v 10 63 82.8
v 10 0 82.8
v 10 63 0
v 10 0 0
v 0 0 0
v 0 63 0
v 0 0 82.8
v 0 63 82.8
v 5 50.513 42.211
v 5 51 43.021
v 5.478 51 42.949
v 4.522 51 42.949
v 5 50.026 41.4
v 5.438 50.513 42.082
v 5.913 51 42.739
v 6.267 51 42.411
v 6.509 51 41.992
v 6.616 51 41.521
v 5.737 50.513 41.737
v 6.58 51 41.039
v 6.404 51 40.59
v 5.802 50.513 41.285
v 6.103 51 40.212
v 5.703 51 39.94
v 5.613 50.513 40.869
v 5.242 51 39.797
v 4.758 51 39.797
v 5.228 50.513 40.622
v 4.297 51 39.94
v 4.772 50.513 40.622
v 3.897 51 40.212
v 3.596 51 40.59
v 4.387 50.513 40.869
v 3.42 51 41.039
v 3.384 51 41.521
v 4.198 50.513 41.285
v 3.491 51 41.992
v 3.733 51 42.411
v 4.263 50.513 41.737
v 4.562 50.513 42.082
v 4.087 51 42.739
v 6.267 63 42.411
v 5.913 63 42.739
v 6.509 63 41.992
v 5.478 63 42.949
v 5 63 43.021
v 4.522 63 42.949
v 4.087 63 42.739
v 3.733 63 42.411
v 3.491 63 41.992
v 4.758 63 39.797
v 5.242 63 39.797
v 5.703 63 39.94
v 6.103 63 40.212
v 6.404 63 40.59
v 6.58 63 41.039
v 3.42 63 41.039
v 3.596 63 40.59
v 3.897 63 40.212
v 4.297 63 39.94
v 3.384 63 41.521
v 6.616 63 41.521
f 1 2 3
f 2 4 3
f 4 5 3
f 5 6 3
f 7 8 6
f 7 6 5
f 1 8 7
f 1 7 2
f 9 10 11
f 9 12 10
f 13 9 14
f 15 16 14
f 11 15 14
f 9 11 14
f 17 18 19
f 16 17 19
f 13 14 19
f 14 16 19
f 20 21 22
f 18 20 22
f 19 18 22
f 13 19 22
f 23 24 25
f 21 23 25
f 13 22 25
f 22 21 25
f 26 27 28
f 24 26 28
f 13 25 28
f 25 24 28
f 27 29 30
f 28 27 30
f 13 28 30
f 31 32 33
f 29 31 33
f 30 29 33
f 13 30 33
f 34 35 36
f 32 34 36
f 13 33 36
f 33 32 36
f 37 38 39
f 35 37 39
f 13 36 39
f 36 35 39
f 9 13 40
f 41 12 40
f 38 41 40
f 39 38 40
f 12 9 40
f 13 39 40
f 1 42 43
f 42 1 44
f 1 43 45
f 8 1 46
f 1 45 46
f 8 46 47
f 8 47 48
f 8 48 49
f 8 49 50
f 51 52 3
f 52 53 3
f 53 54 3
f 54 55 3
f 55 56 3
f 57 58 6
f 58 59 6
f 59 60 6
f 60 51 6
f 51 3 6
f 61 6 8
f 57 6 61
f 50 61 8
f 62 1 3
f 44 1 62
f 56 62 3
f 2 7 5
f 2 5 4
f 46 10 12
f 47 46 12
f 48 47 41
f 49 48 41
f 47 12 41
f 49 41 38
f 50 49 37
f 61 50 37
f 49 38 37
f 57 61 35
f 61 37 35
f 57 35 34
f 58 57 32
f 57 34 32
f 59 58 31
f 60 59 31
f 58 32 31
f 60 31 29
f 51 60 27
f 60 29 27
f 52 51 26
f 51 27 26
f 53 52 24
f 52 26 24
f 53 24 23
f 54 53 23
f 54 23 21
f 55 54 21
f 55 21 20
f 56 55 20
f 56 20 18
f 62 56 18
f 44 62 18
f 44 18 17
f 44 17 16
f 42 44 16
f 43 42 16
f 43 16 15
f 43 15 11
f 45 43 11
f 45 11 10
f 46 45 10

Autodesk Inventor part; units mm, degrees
ref_plane "YZ Plane" through (0, 0, 0) normal (1, 0, 0) x (0, 1, 0)
ref_plane "XZ Plane" through (0, 0, 0) normal (0, 1, 0) x (-1, 0, 0)
ref_plane "XY Plane" through (0, 0, 0) normal (0, 0, 1) x (1, 0, 0)
sketch "Sketch1" plane through (0, 0, 0) normal (0, 0, 1) x (1, 0, 0)
  line L0 (0, 0) -> (10, 0)
  line L1 (10, 0) -> (10, 63)
  line L2 (10, 63) -> (0, 63)
  line L3 (0, 63) -> (0, 0)
  dimension "d0" = 10
  dimension "d1" = 63
extrude "Extrusion1" add sketch "Sketch1" along normal blind 82.8
sketch "m" plane through (0, 63, 0) normal (0, 1, 0) x (1, 0, 0)
  line L0 (0, 0) -> (0, -82.8) projected
  line L1 (10, 0) -> (0, 0) projected
  point P0 (5, -41.4)
  dimension "d4" = 5
  dimension "d5" = 41.4
hole "Hole1" at (5, 63, 41.4) direction (0, -1, 0) diameter 3.242 depth 12 tip angle 118 thread size "M4x0.7" class "6H" standard "ISO Metric profile"
equation "\"d5\" = 0.5 * d2"
equation "\"d2\" = 82.8"
properties part number "Paddle" material "Polypropylene"
